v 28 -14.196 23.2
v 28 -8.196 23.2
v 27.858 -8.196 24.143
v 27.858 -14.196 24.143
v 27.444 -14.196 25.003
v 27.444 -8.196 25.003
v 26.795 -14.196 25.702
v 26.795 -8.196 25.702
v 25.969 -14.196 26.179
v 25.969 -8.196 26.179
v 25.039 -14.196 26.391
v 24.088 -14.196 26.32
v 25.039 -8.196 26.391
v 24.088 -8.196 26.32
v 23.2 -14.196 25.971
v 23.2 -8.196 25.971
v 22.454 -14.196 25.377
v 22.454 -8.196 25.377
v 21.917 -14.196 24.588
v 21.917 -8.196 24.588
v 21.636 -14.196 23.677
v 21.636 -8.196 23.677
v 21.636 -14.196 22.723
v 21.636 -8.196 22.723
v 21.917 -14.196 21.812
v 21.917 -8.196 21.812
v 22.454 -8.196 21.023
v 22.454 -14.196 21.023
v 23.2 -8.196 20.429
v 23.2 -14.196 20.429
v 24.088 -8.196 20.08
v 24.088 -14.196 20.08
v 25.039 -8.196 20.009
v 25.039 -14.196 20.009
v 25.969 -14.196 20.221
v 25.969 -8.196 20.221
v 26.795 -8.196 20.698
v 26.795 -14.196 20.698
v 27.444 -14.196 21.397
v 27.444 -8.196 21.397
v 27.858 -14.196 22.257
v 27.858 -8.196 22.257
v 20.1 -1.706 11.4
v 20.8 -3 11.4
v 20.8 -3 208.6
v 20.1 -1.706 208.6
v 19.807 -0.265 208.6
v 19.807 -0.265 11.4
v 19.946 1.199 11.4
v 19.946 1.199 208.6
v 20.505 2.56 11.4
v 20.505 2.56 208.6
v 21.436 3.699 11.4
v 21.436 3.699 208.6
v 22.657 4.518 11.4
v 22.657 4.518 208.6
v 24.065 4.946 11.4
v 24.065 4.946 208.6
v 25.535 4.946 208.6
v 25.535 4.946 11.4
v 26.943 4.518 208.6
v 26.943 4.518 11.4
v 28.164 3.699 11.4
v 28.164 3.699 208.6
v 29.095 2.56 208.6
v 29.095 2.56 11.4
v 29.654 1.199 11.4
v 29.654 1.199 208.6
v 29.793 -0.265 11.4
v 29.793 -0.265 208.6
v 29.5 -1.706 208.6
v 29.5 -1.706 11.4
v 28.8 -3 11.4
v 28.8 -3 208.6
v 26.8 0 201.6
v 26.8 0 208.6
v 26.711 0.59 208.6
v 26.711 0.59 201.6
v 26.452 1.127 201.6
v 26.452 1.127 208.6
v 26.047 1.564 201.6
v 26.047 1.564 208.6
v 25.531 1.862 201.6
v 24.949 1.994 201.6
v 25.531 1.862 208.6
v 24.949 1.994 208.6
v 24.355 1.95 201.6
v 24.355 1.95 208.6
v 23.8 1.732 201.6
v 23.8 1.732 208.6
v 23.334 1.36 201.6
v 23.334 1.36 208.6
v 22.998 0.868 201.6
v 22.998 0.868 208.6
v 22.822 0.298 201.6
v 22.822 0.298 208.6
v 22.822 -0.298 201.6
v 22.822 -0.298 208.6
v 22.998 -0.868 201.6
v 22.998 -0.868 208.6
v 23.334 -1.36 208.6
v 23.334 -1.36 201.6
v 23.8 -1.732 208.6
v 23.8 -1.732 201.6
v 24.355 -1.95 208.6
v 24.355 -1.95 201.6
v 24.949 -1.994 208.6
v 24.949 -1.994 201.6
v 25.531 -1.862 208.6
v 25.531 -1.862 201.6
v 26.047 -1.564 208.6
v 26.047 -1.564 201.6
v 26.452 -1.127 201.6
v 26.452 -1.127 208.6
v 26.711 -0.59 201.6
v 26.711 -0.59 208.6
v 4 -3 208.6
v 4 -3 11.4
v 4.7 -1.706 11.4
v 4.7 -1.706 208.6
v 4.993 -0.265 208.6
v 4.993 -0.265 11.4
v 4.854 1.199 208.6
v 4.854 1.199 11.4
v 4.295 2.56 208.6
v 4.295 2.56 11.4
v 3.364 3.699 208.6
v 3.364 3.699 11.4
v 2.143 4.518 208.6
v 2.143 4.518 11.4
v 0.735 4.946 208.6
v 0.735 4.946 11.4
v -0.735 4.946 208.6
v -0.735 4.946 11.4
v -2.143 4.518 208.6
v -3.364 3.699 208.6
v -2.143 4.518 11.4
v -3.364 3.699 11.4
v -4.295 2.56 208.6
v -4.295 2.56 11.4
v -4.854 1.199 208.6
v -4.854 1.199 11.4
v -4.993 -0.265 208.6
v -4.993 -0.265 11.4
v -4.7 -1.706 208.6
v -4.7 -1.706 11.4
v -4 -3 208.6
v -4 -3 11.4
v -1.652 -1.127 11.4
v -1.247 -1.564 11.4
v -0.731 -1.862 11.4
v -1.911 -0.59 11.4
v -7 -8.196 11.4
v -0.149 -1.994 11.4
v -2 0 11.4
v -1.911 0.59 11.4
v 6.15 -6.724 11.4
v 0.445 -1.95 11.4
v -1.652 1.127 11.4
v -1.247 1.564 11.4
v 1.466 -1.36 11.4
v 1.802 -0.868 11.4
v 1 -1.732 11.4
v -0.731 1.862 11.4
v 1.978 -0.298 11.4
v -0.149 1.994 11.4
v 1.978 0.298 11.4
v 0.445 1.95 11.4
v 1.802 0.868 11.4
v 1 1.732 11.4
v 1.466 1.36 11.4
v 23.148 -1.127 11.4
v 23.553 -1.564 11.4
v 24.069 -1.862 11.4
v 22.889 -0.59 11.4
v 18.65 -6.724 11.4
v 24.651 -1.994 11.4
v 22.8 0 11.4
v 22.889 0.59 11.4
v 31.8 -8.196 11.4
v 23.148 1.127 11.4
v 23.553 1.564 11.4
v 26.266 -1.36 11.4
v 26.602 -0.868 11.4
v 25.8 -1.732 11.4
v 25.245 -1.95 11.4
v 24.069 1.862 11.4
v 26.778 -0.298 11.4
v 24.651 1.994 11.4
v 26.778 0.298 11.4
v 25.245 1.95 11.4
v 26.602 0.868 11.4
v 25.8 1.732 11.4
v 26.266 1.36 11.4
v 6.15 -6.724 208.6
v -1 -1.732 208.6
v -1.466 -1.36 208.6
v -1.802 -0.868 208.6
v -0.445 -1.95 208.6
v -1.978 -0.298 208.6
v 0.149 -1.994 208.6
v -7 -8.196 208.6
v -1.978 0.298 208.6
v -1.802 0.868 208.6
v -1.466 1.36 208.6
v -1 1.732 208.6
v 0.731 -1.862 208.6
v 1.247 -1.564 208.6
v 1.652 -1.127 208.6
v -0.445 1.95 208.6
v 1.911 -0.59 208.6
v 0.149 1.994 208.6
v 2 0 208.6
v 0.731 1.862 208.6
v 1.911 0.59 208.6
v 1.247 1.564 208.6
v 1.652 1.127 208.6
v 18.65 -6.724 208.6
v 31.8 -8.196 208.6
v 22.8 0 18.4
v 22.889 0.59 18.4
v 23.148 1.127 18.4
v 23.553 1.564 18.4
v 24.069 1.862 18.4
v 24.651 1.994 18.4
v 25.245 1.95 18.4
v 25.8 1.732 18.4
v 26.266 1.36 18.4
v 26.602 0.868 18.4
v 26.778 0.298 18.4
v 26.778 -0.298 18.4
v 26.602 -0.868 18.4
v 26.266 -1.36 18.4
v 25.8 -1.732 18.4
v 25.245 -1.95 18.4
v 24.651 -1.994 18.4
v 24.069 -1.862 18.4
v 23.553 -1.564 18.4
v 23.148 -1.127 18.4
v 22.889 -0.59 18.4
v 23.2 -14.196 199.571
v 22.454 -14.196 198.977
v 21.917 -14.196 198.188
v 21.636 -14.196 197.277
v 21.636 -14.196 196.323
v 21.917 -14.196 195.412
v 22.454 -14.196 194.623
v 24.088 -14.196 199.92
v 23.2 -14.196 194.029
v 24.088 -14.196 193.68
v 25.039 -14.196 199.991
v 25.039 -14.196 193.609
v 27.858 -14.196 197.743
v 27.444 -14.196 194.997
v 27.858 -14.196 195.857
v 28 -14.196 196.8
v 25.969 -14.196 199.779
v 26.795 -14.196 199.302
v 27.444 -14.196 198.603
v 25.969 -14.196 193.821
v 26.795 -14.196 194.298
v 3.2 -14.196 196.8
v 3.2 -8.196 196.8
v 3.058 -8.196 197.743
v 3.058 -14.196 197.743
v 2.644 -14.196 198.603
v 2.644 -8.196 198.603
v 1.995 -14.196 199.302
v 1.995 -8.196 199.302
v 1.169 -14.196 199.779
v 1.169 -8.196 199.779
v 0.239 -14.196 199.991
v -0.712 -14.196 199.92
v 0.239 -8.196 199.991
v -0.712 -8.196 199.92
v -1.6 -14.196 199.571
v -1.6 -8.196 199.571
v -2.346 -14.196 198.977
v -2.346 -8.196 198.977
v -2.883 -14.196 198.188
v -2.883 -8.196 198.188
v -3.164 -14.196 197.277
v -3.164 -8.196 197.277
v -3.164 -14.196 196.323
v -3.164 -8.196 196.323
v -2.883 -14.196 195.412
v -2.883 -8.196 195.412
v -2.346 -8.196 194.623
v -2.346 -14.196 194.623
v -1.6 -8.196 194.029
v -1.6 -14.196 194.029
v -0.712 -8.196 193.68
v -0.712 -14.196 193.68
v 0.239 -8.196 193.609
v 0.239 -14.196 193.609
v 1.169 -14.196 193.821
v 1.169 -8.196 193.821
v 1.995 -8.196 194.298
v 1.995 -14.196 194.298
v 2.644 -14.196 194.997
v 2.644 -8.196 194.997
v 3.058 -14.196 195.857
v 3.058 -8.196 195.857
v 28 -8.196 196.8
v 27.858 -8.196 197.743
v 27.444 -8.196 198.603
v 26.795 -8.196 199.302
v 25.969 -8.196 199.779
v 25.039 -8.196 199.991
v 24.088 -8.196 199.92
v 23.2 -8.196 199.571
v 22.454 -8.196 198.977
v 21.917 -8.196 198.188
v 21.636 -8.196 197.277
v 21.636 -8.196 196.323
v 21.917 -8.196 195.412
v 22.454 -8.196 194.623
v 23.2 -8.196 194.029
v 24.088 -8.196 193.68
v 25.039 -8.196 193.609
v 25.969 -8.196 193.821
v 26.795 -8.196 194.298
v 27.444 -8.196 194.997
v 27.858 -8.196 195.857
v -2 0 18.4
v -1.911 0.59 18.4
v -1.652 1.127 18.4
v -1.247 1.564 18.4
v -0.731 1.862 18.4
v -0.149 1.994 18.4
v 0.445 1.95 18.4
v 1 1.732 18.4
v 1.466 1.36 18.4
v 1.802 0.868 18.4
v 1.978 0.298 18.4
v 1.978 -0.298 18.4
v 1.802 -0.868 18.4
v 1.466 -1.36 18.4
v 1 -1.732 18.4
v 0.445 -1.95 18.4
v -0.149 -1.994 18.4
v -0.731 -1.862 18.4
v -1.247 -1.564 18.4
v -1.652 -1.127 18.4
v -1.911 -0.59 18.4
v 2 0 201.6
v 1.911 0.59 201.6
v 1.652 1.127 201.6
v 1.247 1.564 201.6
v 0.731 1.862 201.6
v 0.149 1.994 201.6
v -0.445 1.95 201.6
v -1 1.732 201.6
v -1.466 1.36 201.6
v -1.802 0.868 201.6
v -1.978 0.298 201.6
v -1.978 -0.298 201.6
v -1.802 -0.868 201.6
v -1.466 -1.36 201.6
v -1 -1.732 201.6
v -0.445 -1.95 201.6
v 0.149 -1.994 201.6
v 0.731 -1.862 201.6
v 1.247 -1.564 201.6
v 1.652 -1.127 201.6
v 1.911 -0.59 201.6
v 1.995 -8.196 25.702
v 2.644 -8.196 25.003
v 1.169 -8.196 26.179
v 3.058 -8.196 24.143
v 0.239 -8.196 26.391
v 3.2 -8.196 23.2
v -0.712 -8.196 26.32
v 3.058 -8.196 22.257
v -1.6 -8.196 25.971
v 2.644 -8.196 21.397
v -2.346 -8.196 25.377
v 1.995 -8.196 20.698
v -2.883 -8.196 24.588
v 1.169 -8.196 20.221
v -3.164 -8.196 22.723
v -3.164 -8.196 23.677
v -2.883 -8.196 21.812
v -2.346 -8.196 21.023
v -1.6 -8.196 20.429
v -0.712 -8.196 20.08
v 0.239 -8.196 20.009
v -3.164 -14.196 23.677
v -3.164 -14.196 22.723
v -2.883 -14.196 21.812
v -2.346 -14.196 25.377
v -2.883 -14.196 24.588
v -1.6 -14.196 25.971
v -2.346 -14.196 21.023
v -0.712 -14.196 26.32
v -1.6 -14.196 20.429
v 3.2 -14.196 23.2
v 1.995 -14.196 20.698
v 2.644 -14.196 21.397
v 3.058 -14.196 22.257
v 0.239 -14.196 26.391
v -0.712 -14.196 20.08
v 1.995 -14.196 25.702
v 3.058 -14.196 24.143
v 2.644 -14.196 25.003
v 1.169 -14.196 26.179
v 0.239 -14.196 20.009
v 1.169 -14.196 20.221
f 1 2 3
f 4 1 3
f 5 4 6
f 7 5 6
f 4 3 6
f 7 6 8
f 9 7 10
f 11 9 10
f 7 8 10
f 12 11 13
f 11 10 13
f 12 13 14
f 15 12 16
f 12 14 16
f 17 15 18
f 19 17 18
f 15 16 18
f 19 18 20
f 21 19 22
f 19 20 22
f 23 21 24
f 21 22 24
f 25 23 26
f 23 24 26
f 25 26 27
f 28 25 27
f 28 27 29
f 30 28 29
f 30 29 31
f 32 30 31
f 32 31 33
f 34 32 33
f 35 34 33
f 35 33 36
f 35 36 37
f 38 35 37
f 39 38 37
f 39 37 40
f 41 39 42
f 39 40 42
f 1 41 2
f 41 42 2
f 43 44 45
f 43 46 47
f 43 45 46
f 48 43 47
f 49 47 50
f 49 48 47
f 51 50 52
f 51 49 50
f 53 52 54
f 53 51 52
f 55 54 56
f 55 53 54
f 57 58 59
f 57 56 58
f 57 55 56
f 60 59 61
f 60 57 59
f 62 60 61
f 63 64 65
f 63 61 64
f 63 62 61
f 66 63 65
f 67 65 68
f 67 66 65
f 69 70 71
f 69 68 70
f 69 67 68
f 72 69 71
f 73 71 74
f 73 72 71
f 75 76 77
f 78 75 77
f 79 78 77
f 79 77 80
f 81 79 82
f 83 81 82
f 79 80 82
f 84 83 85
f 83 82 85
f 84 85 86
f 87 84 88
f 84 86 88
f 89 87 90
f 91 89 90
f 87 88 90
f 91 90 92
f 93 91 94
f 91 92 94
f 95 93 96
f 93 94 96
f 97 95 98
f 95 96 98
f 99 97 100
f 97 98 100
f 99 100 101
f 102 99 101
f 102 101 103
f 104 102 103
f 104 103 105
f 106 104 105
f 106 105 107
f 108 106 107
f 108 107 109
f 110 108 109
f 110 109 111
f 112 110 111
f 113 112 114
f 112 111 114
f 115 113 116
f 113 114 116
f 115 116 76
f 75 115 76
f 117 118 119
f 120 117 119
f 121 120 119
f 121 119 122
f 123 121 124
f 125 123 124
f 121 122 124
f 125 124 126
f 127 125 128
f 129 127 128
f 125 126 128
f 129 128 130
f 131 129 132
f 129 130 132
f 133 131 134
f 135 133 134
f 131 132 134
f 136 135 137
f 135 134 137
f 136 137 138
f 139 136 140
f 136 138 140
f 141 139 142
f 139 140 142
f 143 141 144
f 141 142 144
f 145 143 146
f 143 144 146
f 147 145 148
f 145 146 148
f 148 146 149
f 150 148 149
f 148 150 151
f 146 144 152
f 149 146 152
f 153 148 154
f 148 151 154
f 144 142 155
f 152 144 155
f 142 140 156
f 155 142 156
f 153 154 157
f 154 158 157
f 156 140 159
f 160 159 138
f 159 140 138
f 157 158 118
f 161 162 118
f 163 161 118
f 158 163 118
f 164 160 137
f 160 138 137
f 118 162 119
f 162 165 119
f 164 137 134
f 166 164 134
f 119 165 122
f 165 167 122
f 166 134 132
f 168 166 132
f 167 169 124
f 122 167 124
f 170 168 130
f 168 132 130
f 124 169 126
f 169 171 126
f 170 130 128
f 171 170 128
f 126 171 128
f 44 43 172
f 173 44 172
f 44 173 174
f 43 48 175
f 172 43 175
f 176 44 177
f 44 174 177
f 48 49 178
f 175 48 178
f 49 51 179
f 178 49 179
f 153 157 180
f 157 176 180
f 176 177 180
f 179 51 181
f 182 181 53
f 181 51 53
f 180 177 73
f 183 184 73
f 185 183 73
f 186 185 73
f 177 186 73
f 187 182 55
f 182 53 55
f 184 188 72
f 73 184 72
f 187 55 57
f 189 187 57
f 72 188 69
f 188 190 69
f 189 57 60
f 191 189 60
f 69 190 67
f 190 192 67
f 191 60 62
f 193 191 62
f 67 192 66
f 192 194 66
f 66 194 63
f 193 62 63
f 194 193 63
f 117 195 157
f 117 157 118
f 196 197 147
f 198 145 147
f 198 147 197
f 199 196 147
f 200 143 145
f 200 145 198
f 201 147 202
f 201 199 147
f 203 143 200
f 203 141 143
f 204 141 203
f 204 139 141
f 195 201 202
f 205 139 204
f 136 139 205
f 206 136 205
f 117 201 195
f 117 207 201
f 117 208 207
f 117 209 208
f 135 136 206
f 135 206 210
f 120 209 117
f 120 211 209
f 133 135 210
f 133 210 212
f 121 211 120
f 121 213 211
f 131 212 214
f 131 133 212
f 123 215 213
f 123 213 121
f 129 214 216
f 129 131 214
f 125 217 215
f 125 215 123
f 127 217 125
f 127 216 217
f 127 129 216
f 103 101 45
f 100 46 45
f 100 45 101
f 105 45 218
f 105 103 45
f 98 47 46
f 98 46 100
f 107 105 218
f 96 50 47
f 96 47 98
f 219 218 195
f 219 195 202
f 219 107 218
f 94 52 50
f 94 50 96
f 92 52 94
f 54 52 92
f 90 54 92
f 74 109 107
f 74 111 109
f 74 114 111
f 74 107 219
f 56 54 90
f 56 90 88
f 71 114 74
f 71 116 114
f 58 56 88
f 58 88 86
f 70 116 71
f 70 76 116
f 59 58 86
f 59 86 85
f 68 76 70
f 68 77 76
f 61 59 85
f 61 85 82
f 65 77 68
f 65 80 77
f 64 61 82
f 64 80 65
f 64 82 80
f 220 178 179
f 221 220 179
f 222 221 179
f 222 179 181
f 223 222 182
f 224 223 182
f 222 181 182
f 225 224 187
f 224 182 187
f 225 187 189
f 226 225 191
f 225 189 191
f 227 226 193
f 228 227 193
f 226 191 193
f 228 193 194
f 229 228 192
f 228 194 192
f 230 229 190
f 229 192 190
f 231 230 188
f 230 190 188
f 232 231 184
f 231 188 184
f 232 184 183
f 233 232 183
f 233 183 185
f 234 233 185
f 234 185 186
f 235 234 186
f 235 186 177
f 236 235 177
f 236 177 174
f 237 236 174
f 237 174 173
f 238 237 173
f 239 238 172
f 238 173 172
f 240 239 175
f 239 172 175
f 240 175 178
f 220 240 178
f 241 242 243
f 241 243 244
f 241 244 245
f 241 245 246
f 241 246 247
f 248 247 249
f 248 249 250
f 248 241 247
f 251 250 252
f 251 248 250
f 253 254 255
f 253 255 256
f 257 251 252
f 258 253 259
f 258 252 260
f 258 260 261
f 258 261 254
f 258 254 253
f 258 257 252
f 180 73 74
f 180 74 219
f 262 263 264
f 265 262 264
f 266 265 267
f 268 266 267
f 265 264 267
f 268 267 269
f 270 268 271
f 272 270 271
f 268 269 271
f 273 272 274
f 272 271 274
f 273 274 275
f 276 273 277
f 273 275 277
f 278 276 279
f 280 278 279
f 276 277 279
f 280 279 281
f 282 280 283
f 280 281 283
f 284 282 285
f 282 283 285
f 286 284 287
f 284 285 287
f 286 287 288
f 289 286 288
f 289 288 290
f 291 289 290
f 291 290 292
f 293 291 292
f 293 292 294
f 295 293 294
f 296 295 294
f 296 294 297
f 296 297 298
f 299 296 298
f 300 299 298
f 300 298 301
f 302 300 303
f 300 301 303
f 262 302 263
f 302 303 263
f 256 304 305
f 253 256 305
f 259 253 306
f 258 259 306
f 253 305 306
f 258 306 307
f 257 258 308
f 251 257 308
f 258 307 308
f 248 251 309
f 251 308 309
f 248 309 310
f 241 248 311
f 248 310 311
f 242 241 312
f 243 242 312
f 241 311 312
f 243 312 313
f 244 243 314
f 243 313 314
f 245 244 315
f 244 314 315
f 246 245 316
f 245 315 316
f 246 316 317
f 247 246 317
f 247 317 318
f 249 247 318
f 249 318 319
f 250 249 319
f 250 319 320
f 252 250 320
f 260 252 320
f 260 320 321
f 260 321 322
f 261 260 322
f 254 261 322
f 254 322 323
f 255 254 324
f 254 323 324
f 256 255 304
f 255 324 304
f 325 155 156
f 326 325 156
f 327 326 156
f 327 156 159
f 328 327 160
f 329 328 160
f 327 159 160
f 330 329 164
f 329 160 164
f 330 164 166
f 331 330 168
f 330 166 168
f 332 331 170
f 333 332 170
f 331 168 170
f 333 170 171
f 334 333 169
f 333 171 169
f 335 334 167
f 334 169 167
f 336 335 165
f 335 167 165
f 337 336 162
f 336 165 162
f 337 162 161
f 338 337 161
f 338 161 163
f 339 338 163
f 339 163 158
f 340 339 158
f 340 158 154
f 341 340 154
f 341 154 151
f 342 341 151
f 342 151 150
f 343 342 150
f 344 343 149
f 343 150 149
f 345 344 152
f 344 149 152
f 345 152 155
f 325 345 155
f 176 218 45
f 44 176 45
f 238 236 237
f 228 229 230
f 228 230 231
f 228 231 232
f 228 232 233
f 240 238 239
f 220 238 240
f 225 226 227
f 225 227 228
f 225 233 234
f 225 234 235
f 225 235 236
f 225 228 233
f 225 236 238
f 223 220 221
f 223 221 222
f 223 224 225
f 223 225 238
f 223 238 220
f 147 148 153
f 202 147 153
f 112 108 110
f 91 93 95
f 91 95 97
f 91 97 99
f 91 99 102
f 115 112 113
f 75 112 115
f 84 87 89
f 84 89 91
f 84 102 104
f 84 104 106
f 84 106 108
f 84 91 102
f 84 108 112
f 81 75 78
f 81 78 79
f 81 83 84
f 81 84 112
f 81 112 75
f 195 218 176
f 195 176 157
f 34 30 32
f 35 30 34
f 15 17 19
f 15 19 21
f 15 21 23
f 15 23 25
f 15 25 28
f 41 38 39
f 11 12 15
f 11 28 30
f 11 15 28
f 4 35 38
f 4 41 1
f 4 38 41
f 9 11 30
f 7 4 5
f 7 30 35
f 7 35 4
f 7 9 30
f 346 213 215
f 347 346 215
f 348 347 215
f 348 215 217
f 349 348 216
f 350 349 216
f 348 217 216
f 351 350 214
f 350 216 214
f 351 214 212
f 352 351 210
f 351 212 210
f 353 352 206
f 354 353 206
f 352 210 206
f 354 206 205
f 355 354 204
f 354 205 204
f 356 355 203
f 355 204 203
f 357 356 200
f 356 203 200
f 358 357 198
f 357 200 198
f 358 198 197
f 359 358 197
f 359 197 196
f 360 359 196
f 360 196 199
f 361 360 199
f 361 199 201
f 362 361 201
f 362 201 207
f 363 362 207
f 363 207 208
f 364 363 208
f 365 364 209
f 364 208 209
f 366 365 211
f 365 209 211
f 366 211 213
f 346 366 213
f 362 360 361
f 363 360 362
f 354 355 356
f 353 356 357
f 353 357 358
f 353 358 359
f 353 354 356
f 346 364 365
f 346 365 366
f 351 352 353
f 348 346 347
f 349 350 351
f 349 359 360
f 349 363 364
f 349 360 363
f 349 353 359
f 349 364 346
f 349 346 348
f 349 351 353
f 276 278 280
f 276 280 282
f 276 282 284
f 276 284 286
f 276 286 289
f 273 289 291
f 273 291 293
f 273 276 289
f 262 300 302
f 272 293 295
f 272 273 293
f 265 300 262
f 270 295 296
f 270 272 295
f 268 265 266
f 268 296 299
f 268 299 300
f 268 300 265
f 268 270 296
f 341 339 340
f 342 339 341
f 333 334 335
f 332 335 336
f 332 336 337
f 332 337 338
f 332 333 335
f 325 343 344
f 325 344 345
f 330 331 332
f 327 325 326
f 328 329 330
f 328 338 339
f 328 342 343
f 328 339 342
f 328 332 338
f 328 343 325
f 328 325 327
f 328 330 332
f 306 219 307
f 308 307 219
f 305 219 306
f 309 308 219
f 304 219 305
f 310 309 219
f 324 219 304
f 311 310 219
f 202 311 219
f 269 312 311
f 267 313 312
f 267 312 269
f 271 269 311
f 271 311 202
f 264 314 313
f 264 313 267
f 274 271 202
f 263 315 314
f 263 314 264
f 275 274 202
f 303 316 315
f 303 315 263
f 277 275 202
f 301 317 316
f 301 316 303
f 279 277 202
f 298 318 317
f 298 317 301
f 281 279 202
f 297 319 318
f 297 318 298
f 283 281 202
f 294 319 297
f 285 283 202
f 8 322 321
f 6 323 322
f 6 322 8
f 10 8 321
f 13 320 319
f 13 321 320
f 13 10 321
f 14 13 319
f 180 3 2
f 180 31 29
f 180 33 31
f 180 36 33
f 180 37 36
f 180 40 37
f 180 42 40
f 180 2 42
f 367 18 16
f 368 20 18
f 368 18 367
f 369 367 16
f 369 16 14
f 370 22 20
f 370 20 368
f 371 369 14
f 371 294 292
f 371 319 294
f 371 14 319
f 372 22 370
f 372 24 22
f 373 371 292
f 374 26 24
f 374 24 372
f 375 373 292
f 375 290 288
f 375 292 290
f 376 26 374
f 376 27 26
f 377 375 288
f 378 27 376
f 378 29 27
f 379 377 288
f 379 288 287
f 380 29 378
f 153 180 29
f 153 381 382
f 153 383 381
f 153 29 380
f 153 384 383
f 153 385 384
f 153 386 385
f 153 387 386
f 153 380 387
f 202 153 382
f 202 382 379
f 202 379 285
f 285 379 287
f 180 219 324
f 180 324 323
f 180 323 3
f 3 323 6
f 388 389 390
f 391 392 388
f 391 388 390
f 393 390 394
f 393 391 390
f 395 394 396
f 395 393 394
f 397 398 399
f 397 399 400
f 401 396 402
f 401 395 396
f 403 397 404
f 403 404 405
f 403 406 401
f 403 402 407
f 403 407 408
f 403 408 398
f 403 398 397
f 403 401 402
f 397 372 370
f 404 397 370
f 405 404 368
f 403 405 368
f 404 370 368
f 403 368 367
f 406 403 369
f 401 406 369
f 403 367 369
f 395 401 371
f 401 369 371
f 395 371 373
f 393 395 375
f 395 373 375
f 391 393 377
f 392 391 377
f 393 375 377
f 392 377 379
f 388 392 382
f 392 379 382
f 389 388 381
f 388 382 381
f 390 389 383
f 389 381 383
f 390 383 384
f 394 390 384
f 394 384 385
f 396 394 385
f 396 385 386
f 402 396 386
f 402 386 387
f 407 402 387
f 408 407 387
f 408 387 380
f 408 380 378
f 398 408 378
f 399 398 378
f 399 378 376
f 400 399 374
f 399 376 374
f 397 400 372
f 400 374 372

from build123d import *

# Parameters (mm, degrees)
SKETCH1_R           = 5
BOSS_EXTRUDE1_DEPTH = 220
SKETCH4_R           = 3.2
BOSS_EXTRUDE3_DEPTH = 6
BOSS_EXTRUDE4_DEPTH = 220
SKETCH5_R           = 1.37
CUT_EXTRUDE1_DEPTH  = 7
SKETCH6_R           = 1.37
CUT_EXTRUDE2_DEPTH  = 7
SKETCH7_R           = 3.2
CUT_EXTRUDE3_DEPTH  = 6
CUT_EXTRUDE4_DEPTH  = 11.4
SKETCH10_R          = 2
CUT_EXTRUDE5_DEPTH  = 7
CUT_EXTRUDE6_DEPTH  = 11.4
SKETCH12_R          = 2
CUT_EXTRUDE7_DEPTH  = 7


with BuildPart() as part:
    # Sketch1 → Boss-Extrude1 (new body)
    with BuildSketch(Plane.XY):
        Circle(SKETCH1_R)
        with BuildLine():
            Line((-4, -3), (-7, -8.196152423))
            Line((-7, -8.196152423), (7, -8.196152423))
            Line((7, -8.196152423), (4, -3))
            ThreePointArc((4, -3), (0, 5), (-4, -3))
        make_face()
        with BuildLine():
            Line((28.8, -3), (31.8, -8.196152423))
            Line((31.8, -8.196152423), (17.8, -8.196152423))
            Line((17.8, -8.196152423), (20.8, -3))
            ThreePointArc((20.8, -3), (24.8, 5), (28.8, -3))
        make_face()
    extrude(amount=BOSS_EXTRUDE1_DEPTH)

    # Sketch4 → Boss-Extrude3 (add)
    with BuildSketch(Plane.XZ.offset(8.196152423)):
        with Locations((0, 196.8)):
            Circle(SKETCH4_R)
        with Locations((24.8, 196.8)):
            Circle(SKETCH4_R)
        with Locations((24.8, 172)):
            Circle(SKETCH4_R)
        with Locations((24.8, 147.2)):
            Circle(SKETCH4_R)
        with Locations((24.8, 122.4)):
            Circle(SKETCH4_R)
        with Locations((24.8, 97.6)):
            Circle(SKETCH4_R)
        with Locations((24.8, 72.8)):
            Circle(SKETCH4_R)
        with Locations((24.8, 48)):
            Circle(SKETCH4_R)
        with Locations((24.8, 23.2)):
            Circle(SKETCH4_R)
        with Locations((0, 172)):
            Circle(SKETCH4_R)
        with Locations((0, 147.2)):
            Circle(SKETCH4_R)
        with Locations((0, 122.4)):
            Circle(SKETCH4_R)
        with Locations((0, 97.6)):
            Circle(SKETCH4_R)
        with Locations((0, 72.8)):
            Circle(SKETCH4_R)
        with Locations((0, 48)):
            Circle(SKETCH4_R)
        with Locations((0, 23.2)):
            Circle(SKETCH4_R)
    extrude(amount=BOSS_EXTRUDE3_DEPTH)

    # Sketch3 → Boss-Extrude4 (add)
    with BuildSketch(Plane.XY.offset(220)):
        Polygon((7, -8.196152423), (17.8, -8.196152423), (18.65, -8.196152423), (18.65, -6.723909236), (6.15, -6.723909236), (6.15, -8.196152423), align=None)
    extrude(amount=-BOSS_EXTRUDE4_DEPTH)

    # Sketch5 → Cut-Extrude1 (cut)
    with BuildSketch(Plane(origin=(0, 0, 0), x_dir=(-1, 0, 0), z_dir=(0, 0, -1))):
        Circle(SKETCH5_R)
        with Locations((-24.8, 0)):
            Circle(SKETCH5_R)
    extrude(amount=-CUT_EXTRUDE1_DEPTH, mode=Mode.SUBTRACT)

    # Sketch6 → Cut-Extrude2 (cut)
    with BuildSketch(Plane.XY.offset(220)):
        Circle(SKETCH6_R)
        with Locations((24.8, 0)):
            Circle(SKETCH6_R)
    extrude(amount=-CUT_EXTRUDE2_DEPTH, mode=Mode.SUBTRACT)

    # Sketch7 → Cut-Extrude3 (cut)
    with BuildSketch(Plane.XZ.offset(14.196152423)):
        with Locations((0, 172)):
            Circle(SKETCH7_R)
        with Locations((24.8, 172)):
            Circle(SKETCH7_R)
        with Locations((24.8, 147.2)):
            Circle(SKETCH7_R)
        with Locations((24.8, 122.4)):
            Circle(SKETCH7_R)
        with Locations((24.8, 97.6)):
            Circle(SKETCH7_R)
        with Locations((24.8, 72.8)):
            Circle(SKETCH7_R)
        with Locations((24.8, 48)):
            Circle(SKETCH7_R)
        with Locations((0, 147.2)):
            Circle(SKETCH7_R)
        with Locations((0, 122.4)):
            Circle(SKETCH7_R)
        with Locations((0, 97.6)):
            Circle(SKETCH7_R)
        with Locations((0, 72.8)):
            Circle(SKETCH7_R)
        with Locations((0, 48)):
            Circle(SKETCH7_R)
    extrude(amount=-CUT_EXTRUDE3_DEPTH, mode=Mode.SUBTRACT)

    # Sketch9 → Cut-Extrude4 (cut)
    with BuildSketch(Plane(origin=(0, 0, 0), x_dir=(-1, 0, 0), z_dir=(0, 0, -1))):
        with BuildLine():
            Line((4, -3), (7, -8.196152423))
            Line((7, -8.196152423), (-31.8, -8.196152423))
            Line((-31.8, -8.196152423), (-28.8, -3))
            ThreePointArc((-28.8, -3), (-24.8, 5), (-20.8, -3))
            Line((-20.8, -3), (-18.65, -6.723909236))
            Line((-18.65, -6.723909236), (-6.15, -6.723909236))
            Line((-6.15, -6.723909236), (-4, -3))
            ThreePointArc((-4, -3), (0, 5), (4, -3))
        make_face()
    extrude(amount=-CUT_EXTRUDE4_DEPTH, mode=Mode.SUBTRACT)

    # Sketch10 → Cut-Extrude5 (cut)
    with BuildSketch(Plane(origin=(0, 0, 11.4), x_dir=(-1, 0, 0), z_dir=(0, 0, -1))):
        with Locations((-24.8, 0)):
            Circle(SKETCH10_R)
        Circle(SKETCH10_R)
    extrude(amount=-CUT_EXTRUDE5_DEPTH, mode=Mode.SUBTRACT)

    # Sketch11 → Cut-Extrude6 (cut)
    with BuildSketch(Plane.XY.offset(220)):
        with BuildLine():
            Line((20.8, -3), (18.65, -6.723909236))
            Line((18.65, -6.723909236), (6.15, -6.723909236))
            Line((6.15, -6.723909236), (4, -3))
            ThreePointArc((4, -3), (0, 5), (-4, -3))
            Line((-4, -3), (-7, -8.196152423))
            Line((-7, -8.196152423), (31.8, -8.196152423))
            Line((31.8, -8.196152423), (28.8, -3))
            ThreePointArc((28.8, -3), (24.8, 5), (20.8, -3))
        make_face()
    extrude(amount=-CUT_EXTRUDE6_DEPTH, mode=Mode.SUBTRACT)

    # Sketch12 → Cut-Extrude7 (cut)
    with BuildSketch(Plane.XY.offset(208.6)):
        Circle(SKETCH12_R)
        with Locations((24.8, 0)):
            Circle(SKETCH12_R)
    extrude(amount=-CUT_EXTRUDE7_DEPTH, mode=Mode.SUBTRACT)


solid = part.part
